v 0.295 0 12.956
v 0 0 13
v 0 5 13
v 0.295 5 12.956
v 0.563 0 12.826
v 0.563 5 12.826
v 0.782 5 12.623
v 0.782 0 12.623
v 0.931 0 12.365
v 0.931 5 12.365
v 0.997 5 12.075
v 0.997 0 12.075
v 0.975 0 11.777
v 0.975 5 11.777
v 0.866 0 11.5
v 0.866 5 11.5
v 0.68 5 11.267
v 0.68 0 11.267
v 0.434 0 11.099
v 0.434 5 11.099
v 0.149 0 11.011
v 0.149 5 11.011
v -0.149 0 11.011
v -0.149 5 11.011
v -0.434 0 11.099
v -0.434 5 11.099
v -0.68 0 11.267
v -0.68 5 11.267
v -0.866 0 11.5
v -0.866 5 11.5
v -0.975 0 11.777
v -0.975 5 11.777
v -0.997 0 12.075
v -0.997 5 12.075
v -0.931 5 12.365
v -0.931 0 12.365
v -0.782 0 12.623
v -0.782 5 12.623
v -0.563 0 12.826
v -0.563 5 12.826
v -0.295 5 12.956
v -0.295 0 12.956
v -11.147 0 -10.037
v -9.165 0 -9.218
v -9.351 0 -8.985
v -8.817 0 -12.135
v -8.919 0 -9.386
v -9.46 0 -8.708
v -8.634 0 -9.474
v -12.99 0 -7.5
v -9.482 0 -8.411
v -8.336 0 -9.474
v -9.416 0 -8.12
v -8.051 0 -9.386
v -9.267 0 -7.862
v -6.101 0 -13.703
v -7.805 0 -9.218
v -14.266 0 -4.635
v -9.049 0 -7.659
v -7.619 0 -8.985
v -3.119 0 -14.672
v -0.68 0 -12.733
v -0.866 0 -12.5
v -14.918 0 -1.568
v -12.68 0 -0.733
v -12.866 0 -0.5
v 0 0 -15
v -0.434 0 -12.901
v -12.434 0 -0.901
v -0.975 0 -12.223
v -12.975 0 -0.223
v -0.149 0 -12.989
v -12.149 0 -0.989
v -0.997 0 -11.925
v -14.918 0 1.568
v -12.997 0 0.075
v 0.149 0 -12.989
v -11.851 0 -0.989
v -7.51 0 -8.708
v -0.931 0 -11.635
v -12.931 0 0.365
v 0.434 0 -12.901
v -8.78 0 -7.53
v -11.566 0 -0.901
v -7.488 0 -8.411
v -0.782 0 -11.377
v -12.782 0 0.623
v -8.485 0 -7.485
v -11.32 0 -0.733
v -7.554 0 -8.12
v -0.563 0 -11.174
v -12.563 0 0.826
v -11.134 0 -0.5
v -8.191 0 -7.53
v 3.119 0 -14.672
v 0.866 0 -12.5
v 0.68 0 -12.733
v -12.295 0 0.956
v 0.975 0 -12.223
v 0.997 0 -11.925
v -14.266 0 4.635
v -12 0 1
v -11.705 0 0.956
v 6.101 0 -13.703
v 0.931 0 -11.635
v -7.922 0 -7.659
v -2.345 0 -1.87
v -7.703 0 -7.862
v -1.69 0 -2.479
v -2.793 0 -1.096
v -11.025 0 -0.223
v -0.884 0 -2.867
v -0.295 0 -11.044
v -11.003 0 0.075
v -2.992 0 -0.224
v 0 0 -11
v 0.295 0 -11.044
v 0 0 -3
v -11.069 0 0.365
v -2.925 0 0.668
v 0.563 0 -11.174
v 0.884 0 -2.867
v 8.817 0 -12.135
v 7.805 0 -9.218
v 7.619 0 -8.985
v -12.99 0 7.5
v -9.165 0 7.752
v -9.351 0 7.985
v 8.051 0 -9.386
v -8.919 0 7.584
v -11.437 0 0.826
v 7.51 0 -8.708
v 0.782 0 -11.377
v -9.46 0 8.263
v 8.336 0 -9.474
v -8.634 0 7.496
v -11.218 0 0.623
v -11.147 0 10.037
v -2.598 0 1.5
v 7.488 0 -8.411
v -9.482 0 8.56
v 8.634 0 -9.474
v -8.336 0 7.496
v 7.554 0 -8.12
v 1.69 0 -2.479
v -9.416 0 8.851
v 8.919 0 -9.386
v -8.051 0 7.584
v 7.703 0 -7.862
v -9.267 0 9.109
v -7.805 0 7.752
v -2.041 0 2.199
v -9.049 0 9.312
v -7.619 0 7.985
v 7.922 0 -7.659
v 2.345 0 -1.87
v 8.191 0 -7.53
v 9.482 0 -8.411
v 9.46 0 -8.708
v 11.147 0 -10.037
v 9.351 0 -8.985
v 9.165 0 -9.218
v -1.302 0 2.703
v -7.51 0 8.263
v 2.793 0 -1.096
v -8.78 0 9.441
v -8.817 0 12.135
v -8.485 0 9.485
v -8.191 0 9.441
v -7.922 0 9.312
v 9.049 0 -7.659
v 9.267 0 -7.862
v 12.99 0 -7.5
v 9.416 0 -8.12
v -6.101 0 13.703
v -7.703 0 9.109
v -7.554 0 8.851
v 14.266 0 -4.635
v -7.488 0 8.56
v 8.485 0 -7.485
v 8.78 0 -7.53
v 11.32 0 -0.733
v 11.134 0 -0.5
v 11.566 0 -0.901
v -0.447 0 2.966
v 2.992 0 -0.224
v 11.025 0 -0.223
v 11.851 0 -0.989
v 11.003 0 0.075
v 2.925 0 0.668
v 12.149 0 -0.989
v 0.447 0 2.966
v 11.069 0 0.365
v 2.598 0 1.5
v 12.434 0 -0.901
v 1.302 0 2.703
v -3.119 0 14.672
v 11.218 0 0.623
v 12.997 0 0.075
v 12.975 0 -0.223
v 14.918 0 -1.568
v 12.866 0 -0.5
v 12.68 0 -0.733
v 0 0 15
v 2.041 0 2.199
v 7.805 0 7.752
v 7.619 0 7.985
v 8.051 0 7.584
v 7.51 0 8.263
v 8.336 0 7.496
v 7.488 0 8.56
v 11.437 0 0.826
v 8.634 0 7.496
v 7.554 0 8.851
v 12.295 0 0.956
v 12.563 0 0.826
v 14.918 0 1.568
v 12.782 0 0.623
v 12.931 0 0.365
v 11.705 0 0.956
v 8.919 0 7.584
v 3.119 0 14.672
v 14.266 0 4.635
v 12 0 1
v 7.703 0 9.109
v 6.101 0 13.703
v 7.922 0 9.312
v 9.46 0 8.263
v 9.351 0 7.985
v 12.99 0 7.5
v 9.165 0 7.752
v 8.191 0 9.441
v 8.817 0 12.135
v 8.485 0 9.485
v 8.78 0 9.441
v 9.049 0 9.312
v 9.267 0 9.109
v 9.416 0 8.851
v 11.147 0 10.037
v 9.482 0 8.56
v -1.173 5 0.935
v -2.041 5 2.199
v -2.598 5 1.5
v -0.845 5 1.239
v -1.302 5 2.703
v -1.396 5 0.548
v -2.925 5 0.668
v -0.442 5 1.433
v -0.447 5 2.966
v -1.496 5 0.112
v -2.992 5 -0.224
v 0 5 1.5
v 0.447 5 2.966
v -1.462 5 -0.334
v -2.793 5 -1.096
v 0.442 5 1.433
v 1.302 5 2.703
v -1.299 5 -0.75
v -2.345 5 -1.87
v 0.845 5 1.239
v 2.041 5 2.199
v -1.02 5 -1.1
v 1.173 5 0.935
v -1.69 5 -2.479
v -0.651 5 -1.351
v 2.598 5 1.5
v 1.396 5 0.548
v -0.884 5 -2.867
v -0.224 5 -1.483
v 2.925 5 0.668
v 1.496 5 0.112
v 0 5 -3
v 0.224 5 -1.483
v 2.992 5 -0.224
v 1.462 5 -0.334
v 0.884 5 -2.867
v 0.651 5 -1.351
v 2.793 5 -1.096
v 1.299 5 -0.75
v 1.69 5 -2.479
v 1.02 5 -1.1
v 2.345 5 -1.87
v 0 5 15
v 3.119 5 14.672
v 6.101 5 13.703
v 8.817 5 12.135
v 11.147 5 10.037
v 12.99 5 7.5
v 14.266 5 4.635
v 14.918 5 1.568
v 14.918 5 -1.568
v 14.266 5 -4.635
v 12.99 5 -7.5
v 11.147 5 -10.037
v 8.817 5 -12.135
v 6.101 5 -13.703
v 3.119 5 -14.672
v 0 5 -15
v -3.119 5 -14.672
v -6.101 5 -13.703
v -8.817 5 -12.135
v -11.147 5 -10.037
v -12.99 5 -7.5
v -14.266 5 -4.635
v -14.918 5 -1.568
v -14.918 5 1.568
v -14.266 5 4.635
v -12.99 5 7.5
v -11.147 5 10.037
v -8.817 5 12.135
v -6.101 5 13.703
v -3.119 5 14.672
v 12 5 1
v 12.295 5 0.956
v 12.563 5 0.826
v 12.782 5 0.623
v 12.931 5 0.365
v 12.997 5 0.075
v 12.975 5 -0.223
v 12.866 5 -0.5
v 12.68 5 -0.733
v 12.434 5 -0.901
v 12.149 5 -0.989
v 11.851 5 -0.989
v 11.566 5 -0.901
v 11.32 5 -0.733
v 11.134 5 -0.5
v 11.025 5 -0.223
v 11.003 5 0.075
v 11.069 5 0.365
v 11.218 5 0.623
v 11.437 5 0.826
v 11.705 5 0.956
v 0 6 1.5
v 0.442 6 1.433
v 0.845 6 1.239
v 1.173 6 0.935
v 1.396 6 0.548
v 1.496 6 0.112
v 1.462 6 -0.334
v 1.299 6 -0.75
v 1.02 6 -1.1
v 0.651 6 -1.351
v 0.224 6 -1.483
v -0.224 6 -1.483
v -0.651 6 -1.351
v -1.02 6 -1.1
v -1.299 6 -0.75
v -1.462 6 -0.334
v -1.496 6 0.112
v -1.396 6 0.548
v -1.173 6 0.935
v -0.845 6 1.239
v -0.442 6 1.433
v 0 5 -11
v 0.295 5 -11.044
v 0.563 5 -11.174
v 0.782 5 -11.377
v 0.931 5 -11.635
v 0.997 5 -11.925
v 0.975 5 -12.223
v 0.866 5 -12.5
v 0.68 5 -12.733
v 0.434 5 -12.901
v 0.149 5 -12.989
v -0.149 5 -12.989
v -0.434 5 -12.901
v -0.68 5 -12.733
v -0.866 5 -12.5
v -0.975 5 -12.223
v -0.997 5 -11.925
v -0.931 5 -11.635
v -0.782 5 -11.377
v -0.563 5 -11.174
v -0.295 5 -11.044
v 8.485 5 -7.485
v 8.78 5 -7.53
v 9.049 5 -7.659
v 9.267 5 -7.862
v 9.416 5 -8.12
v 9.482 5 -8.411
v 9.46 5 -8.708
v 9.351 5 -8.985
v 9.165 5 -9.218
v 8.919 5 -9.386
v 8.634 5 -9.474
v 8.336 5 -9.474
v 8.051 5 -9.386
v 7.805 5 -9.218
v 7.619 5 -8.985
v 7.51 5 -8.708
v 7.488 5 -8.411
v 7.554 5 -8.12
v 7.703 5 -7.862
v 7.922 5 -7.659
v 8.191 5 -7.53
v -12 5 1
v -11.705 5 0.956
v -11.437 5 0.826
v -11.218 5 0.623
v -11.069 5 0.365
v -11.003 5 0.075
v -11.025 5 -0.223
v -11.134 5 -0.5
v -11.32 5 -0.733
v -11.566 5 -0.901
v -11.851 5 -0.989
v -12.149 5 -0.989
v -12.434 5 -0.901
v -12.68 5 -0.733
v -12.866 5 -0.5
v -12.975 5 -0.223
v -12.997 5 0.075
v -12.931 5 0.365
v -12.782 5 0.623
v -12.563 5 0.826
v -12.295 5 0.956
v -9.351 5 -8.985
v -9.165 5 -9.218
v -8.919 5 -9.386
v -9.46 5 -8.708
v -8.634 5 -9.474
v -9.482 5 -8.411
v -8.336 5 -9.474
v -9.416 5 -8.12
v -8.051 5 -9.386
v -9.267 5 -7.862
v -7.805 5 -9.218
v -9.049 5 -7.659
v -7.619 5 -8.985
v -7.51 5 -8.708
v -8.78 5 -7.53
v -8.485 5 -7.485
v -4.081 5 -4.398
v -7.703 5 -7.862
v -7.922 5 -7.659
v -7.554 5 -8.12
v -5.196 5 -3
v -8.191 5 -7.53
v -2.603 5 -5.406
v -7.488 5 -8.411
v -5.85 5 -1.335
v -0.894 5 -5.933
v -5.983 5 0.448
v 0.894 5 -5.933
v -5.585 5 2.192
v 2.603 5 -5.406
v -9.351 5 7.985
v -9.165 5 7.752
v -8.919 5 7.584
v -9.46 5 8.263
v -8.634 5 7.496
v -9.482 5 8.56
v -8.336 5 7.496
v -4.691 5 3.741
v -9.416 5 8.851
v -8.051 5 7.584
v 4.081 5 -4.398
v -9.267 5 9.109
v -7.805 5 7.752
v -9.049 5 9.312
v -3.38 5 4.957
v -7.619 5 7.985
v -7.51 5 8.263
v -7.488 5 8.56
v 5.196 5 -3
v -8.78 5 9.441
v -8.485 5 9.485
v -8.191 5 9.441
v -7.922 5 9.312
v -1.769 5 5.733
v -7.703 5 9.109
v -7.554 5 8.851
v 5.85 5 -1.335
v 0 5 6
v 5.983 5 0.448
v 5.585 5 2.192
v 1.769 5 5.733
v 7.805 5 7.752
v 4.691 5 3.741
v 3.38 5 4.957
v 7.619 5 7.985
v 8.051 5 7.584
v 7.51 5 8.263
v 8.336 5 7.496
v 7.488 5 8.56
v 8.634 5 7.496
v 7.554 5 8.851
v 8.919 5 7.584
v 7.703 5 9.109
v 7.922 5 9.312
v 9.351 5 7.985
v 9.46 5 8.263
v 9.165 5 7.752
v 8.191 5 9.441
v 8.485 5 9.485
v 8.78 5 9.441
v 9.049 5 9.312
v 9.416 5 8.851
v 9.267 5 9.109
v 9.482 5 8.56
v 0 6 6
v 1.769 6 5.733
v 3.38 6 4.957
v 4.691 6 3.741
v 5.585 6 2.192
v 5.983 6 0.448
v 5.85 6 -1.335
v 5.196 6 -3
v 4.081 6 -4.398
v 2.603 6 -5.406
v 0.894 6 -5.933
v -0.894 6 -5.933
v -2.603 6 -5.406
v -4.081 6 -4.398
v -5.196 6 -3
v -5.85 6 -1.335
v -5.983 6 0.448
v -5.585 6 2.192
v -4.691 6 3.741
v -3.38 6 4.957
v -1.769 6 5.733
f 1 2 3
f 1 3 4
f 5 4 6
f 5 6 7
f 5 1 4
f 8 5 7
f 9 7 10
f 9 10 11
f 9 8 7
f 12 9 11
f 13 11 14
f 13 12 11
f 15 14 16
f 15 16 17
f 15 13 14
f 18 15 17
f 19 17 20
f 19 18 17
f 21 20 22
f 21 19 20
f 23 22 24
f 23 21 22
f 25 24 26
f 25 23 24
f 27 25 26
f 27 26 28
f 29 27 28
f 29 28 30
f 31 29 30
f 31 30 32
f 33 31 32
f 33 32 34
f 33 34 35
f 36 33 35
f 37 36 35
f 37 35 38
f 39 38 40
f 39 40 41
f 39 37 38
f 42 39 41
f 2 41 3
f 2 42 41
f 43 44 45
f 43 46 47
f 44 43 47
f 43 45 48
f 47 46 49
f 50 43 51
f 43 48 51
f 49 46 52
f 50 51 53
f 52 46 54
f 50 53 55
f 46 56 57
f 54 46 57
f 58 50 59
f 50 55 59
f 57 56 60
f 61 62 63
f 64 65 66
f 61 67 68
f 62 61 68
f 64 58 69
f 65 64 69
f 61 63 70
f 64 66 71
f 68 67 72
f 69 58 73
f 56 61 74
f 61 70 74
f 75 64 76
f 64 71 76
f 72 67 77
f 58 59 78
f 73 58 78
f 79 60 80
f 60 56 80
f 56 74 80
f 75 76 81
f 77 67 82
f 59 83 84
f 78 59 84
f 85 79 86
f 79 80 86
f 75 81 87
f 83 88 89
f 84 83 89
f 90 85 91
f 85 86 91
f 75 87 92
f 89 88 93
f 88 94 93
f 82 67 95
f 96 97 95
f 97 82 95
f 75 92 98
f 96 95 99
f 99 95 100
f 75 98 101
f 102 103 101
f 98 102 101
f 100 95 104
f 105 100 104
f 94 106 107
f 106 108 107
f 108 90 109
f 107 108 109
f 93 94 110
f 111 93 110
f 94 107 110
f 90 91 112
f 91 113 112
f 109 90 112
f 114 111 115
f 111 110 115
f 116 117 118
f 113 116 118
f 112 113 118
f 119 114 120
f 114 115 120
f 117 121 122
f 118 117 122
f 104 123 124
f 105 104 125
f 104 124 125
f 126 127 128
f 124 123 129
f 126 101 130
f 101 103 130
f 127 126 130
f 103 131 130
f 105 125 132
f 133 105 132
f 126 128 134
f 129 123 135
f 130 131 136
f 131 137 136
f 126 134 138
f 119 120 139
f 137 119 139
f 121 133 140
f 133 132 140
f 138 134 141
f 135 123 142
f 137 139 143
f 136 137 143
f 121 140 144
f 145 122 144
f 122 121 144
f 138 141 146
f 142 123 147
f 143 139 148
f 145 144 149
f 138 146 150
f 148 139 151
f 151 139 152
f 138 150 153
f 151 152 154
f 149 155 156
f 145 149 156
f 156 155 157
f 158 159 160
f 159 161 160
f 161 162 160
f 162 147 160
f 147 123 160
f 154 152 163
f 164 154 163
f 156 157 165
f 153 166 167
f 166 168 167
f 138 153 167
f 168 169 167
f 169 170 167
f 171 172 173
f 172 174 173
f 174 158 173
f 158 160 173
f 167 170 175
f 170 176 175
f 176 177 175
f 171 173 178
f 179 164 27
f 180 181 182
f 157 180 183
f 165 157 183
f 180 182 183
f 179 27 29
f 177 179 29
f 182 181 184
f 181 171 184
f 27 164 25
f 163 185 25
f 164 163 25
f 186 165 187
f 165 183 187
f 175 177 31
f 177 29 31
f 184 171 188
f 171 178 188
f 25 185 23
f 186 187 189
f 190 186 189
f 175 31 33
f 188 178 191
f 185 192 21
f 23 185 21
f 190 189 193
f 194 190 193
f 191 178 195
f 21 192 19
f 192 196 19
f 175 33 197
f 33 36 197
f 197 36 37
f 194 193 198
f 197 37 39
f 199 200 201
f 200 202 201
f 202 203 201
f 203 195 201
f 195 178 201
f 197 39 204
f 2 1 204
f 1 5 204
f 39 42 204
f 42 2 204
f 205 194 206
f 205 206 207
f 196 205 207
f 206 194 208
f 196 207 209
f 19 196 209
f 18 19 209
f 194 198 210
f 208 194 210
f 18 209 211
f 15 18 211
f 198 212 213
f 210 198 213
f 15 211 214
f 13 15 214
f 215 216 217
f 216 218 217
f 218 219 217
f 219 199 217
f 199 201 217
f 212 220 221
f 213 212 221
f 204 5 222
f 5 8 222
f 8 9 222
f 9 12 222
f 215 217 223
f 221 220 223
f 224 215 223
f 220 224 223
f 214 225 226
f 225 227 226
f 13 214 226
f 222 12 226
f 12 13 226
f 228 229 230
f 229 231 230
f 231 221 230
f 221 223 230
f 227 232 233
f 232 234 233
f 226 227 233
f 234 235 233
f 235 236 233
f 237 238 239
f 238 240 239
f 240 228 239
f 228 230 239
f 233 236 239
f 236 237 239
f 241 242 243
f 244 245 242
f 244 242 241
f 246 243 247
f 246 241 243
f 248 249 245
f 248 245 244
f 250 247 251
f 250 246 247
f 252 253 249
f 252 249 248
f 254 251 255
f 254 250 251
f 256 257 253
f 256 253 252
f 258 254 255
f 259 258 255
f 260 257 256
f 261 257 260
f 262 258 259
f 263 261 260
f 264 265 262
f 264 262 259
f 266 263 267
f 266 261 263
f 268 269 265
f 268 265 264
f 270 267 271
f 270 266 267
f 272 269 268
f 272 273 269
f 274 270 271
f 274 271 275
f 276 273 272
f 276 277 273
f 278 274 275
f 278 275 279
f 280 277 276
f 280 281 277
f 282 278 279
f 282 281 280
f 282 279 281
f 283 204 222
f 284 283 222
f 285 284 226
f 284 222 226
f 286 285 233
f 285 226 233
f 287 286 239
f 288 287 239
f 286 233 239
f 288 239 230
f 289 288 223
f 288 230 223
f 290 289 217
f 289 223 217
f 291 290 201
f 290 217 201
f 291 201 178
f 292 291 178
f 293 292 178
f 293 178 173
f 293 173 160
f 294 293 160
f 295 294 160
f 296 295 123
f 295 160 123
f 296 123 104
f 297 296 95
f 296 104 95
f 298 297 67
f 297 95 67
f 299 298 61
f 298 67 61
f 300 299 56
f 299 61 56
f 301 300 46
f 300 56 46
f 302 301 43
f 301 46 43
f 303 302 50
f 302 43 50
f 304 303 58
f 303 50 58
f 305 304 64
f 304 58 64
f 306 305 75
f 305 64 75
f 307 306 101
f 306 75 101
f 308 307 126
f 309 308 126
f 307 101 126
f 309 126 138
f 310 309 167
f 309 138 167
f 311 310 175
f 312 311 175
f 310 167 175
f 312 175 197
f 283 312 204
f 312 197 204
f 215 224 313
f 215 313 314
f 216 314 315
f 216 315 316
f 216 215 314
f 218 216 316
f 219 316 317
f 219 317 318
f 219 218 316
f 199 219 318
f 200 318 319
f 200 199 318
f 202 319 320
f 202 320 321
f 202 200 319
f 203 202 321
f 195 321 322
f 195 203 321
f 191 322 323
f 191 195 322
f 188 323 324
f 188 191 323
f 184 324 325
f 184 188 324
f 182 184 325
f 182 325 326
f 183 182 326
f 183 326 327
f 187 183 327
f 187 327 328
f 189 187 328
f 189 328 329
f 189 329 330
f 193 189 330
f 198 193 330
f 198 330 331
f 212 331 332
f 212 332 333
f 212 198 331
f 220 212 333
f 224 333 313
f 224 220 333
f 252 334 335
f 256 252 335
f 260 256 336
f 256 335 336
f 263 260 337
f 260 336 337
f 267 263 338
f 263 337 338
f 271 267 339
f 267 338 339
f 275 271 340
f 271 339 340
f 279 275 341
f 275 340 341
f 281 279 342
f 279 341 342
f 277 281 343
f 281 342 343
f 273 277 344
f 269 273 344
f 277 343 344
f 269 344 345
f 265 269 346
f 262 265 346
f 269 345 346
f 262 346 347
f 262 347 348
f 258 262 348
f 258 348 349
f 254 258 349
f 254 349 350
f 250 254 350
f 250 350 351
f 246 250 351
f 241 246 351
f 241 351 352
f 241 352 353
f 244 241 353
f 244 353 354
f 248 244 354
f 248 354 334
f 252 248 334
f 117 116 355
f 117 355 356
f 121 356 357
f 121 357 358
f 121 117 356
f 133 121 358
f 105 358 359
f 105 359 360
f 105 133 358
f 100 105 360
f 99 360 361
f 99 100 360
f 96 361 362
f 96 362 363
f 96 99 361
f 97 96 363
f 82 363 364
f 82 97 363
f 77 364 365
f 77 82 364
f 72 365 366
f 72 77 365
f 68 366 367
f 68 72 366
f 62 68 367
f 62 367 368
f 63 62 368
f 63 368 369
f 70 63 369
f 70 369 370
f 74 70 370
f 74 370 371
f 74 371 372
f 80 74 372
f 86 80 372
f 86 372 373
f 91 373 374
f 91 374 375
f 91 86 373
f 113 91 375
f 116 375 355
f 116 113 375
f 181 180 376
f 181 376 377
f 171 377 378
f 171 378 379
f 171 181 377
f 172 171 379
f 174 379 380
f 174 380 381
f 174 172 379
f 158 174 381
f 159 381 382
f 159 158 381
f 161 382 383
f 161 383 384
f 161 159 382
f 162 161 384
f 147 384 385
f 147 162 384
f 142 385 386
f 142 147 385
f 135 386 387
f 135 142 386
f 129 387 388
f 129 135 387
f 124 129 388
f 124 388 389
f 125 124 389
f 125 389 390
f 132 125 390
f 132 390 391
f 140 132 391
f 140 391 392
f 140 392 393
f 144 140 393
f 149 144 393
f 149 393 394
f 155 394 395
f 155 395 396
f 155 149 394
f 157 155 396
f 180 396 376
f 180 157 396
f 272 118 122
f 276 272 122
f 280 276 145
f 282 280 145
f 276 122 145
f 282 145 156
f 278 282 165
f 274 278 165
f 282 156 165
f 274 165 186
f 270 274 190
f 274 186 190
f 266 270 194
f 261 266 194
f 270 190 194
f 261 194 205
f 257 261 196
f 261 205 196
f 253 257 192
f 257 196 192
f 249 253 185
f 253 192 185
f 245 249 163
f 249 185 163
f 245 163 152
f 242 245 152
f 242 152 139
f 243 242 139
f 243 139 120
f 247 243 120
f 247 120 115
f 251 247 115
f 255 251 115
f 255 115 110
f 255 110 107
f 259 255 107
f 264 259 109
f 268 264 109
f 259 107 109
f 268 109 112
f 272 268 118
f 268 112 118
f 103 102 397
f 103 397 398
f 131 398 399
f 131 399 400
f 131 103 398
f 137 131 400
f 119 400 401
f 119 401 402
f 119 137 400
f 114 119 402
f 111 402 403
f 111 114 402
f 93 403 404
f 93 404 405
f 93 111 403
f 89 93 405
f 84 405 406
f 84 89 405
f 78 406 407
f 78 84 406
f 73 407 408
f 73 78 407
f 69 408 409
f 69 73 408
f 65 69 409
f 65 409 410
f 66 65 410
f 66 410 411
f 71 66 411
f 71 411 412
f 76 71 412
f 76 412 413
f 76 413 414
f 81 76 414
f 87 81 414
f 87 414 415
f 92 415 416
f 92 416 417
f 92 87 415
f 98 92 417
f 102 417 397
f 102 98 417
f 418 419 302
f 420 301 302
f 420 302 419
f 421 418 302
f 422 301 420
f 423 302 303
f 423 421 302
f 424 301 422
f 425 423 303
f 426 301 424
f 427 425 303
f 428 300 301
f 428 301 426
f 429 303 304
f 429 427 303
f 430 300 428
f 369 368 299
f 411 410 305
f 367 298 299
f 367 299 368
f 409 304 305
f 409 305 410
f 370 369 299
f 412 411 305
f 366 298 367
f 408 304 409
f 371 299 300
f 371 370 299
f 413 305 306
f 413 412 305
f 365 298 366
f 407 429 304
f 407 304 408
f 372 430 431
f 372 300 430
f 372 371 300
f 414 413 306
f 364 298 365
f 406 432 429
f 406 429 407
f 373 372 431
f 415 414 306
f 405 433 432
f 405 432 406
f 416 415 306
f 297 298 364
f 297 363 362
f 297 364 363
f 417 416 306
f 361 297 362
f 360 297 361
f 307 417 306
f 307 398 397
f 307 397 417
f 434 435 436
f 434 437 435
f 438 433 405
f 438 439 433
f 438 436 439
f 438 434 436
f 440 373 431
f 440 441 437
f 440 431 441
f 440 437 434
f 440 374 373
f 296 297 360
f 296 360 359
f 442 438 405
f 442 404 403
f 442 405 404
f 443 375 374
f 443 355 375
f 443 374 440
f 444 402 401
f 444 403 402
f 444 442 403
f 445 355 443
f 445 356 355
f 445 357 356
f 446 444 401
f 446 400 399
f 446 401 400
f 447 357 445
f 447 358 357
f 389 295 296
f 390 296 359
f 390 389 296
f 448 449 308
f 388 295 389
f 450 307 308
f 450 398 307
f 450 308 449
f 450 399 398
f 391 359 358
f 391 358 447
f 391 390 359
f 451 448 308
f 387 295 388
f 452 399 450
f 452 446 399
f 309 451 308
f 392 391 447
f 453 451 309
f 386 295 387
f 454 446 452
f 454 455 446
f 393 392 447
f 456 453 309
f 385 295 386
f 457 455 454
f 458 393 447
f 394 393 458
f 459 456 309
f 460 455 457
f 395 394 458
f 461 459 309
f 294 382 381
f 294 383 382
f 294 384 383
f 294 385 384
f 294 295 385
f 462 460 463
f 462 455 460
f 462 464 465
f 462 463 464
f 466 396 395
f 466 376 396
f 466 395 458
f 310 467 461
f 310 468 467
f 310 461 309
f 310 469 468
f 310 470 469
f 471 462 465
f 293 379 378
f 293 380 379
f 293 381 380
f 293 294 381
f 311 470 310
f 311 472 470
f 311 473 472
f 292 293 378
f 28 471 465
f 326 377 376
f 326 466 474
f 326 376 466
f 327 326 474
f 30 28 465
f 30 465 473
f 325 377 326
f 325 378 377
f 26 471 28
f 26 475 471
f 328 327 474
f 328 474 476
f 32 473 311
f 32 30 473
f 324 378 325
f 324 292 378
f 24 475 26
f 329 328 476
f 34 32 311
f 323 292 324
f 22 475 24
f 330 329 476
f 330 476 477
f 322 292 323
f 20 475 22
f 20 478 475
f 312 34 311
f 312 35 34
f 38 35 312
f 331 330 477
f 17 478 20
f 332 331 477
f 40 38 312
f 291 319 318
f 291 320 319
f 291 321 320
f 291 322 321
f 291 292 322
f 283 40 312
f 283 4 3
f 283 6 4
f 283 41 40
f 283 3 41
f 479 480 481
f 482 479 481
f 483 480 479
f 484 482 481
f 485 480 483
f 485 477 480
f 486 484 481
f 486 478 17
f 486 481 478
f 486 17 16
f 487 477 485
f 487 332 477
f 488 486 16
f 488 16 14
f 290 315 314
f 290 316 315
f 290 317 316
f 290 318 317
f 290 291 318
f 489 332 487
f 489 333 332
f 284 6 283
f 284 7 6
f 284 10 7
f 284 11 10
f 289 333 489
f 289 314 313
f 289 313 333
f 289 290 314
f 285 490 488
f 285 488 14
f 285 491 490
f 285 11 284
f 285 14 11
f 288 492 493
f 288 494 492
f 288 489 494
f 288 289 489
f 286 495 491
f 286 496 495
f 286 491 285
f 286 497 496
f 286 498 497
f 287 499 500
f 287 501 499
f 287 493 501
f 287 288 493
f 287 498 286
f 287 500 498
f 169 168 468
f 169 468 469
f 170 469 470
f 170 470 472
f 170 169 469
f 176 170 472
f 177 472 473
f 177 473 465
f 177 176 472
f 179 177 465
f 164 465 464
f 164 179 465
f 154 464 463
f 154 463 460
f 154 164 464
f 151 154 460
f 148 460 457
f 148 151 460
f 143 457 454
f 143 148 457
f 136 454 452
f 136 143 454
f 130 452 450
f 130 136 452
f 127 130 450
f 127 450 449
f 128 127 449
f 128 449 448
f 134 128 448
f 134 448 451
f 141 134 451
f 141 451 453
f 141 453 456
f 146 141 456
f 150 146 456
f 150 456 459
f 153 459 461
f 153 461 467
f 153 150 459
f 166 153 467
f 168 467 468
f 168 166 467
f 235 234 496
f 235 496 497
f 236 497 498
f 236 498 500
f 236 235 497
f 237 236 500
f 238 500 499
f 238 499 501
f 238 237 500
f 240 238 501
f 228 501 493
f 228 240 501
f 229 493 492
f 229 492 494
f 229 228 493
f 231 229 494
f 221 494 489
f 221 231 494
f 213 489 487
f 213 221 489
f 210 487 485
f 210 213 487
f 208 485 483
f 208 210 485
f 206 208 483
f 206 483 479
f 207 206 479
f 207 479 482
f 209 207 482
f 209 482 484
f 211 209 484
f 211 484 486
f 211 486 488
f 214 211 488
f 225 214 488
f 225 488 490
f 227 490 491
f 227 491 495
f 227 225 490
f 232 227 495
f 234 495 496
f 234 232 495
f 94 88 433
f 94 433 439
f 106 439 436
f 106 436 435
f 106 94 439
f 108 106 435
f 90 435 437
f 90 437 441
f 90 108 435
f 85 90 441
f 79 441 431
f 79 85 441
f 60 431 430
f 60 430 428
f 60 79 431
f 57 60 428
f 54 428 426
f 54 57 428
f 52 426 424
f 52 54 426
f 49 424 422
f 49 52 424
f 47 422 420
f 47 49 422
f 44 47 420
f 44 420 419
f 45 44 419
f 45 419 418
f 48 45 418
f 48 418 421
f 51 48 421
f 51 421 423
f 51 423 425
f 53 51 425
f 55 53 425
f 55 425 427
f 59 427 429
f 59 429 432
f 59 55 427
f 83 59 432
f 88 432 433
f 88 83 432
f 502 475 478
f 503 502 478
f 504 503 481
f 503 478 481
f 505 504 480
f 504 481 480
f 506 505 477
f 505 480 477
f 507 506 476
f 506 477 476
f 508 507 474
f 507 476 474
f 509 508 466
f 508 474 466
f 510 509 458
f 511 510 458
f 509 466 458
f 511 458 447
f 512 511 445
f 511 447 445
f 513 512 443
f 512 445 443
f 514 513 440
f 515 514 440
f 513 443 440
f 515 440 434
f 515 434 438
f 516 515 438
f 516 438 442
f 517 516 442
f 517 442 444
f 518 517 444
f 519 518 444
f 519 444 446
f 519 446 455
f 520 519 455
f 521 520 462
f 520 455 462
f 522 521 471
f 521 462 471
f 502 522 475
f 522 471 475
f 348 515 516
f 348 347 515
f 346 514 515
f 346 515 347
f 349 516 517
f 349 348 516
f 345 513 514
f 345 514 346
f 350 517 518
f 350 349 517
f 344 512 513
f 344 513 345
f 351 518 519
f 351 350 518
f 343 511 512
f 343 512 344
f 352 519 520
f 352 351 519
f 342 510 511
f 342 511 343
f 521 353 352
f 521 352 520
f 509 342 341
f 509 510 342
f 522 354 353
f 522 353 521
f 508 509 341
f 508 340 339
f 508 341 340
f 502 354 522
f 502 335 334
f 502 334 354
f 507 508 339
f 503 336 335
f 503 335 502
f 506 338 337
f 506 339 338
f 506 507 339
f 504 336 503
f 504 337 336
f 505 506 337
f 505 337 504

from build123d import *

# Parameters (mm, degrees)
SKETCH1_R           = 15
SKETCH1_R_2         = 1
BOSS_EXTRUDE1_DEPTH = 5
SKETCH2_R           = 6
BOSS_EXTRUDE2_DEPTH = 1
SKETCH3_R           = 3
CUT_EXTRUDE1_DEPTH  = 5
SKETCH4_R           = 1.5
CUT_EXTRUDE2_DEPTH  = 5


with BuildPart() as part:
    # Sketch1 → Boss-Extrude1 (new body)
    with BuildSketch(Plane(origin=(0, 0, 0), x_dir=(1, 0, 0), z_dir=(0, 1, 0))):
        with Locations(Location((0, 0, 0), (0, 0, 270))):
            Circle(SKETCH1_R)
        with Locations(Location((0, 12, 0), (0, 0, 270))):
            Circle(SKETCH1_R_2, mode=Mode.SUBTRACT)
        with Locations(Location((8.485281374, 8.485281374, 0), (0, 0, 270))):
            Circle(SKETCH1_R_2, mode=Mode.SUBTRACT)
        with Locations(Location((12, 0, 0), (0, 0, 270))):
            Circle(SKETCH1_R_2, mode=Mode.SUBTRACT)
        with Locations(Location((8.485281374, -8.485281374, 0), (0, 0, 270))):
            Circle(SKETCH1_R_2, mode=Mode.SUBTRACT)
        with Locations(Location((0, -12, 0), (0, 0, 270))):
            Circle(SKETCH1_R_2, mode=Mode.SUBTRACT)
        with Locations(Location((-8.485281374, -8.485281374, 0), (0, 0, 270))):
            Circle(SKETCH1_R_2, mode=Mode.SUBTRACT)
        with Locations(Location((-12, 0, 0), (0, 0, 270))):
            Circle(SKETCH1_R_2, mode=Mode.SUBTRACT)
        with Locations(Location((-8.485281374, 8.485281374, 0), (0, 0, 270))):
            Circle(SKETCH1_R_2, mode=Mode.SUBTRACT)
    extrude(amount=BOSS_EXTRUDE1_DEPTH)

    # Sketch2 → Boss-Extrude2 (add)
    with BuildSketch(Plane(origin=(0, 5, 0), x_dir=(1, 0, 0), z_dir=(0, 1, 0))):
        with Locations(Location((0, 0, 0), (0, 0, 270))):
            Circle(SKETCH2_R)
    extrude(amount=BOSS_EXTRUDE2_DEPTH)

    # Sketch3 → Cut-Extrude1 (cut)
    with BuildSketch(Plane.XZ):
        with Locations(Location((0, 0, 0), (0, 0, 270))):
            Circle(SKETCH3_R)
    extrude(amount=-CUT_EXTRUDE1_DEPTH, mode=Mode.SUBTRACT)

    # Sketch4 → Cut-Extrude2 (cut)
    with BuildSketch(Plane(origin=(0, 6, 0), x_dir=(1, 0, 0), z_dir=(0, 1, 0))):
        with Locations(Location((0, 0, 0), (0, 0, 270))):
            Circle(SKETCH4_R)
    extrude(amount=-CUT_EXTRUDE2_DEPTH, mode=Mode.SUBTRACT)


solid = part.part
